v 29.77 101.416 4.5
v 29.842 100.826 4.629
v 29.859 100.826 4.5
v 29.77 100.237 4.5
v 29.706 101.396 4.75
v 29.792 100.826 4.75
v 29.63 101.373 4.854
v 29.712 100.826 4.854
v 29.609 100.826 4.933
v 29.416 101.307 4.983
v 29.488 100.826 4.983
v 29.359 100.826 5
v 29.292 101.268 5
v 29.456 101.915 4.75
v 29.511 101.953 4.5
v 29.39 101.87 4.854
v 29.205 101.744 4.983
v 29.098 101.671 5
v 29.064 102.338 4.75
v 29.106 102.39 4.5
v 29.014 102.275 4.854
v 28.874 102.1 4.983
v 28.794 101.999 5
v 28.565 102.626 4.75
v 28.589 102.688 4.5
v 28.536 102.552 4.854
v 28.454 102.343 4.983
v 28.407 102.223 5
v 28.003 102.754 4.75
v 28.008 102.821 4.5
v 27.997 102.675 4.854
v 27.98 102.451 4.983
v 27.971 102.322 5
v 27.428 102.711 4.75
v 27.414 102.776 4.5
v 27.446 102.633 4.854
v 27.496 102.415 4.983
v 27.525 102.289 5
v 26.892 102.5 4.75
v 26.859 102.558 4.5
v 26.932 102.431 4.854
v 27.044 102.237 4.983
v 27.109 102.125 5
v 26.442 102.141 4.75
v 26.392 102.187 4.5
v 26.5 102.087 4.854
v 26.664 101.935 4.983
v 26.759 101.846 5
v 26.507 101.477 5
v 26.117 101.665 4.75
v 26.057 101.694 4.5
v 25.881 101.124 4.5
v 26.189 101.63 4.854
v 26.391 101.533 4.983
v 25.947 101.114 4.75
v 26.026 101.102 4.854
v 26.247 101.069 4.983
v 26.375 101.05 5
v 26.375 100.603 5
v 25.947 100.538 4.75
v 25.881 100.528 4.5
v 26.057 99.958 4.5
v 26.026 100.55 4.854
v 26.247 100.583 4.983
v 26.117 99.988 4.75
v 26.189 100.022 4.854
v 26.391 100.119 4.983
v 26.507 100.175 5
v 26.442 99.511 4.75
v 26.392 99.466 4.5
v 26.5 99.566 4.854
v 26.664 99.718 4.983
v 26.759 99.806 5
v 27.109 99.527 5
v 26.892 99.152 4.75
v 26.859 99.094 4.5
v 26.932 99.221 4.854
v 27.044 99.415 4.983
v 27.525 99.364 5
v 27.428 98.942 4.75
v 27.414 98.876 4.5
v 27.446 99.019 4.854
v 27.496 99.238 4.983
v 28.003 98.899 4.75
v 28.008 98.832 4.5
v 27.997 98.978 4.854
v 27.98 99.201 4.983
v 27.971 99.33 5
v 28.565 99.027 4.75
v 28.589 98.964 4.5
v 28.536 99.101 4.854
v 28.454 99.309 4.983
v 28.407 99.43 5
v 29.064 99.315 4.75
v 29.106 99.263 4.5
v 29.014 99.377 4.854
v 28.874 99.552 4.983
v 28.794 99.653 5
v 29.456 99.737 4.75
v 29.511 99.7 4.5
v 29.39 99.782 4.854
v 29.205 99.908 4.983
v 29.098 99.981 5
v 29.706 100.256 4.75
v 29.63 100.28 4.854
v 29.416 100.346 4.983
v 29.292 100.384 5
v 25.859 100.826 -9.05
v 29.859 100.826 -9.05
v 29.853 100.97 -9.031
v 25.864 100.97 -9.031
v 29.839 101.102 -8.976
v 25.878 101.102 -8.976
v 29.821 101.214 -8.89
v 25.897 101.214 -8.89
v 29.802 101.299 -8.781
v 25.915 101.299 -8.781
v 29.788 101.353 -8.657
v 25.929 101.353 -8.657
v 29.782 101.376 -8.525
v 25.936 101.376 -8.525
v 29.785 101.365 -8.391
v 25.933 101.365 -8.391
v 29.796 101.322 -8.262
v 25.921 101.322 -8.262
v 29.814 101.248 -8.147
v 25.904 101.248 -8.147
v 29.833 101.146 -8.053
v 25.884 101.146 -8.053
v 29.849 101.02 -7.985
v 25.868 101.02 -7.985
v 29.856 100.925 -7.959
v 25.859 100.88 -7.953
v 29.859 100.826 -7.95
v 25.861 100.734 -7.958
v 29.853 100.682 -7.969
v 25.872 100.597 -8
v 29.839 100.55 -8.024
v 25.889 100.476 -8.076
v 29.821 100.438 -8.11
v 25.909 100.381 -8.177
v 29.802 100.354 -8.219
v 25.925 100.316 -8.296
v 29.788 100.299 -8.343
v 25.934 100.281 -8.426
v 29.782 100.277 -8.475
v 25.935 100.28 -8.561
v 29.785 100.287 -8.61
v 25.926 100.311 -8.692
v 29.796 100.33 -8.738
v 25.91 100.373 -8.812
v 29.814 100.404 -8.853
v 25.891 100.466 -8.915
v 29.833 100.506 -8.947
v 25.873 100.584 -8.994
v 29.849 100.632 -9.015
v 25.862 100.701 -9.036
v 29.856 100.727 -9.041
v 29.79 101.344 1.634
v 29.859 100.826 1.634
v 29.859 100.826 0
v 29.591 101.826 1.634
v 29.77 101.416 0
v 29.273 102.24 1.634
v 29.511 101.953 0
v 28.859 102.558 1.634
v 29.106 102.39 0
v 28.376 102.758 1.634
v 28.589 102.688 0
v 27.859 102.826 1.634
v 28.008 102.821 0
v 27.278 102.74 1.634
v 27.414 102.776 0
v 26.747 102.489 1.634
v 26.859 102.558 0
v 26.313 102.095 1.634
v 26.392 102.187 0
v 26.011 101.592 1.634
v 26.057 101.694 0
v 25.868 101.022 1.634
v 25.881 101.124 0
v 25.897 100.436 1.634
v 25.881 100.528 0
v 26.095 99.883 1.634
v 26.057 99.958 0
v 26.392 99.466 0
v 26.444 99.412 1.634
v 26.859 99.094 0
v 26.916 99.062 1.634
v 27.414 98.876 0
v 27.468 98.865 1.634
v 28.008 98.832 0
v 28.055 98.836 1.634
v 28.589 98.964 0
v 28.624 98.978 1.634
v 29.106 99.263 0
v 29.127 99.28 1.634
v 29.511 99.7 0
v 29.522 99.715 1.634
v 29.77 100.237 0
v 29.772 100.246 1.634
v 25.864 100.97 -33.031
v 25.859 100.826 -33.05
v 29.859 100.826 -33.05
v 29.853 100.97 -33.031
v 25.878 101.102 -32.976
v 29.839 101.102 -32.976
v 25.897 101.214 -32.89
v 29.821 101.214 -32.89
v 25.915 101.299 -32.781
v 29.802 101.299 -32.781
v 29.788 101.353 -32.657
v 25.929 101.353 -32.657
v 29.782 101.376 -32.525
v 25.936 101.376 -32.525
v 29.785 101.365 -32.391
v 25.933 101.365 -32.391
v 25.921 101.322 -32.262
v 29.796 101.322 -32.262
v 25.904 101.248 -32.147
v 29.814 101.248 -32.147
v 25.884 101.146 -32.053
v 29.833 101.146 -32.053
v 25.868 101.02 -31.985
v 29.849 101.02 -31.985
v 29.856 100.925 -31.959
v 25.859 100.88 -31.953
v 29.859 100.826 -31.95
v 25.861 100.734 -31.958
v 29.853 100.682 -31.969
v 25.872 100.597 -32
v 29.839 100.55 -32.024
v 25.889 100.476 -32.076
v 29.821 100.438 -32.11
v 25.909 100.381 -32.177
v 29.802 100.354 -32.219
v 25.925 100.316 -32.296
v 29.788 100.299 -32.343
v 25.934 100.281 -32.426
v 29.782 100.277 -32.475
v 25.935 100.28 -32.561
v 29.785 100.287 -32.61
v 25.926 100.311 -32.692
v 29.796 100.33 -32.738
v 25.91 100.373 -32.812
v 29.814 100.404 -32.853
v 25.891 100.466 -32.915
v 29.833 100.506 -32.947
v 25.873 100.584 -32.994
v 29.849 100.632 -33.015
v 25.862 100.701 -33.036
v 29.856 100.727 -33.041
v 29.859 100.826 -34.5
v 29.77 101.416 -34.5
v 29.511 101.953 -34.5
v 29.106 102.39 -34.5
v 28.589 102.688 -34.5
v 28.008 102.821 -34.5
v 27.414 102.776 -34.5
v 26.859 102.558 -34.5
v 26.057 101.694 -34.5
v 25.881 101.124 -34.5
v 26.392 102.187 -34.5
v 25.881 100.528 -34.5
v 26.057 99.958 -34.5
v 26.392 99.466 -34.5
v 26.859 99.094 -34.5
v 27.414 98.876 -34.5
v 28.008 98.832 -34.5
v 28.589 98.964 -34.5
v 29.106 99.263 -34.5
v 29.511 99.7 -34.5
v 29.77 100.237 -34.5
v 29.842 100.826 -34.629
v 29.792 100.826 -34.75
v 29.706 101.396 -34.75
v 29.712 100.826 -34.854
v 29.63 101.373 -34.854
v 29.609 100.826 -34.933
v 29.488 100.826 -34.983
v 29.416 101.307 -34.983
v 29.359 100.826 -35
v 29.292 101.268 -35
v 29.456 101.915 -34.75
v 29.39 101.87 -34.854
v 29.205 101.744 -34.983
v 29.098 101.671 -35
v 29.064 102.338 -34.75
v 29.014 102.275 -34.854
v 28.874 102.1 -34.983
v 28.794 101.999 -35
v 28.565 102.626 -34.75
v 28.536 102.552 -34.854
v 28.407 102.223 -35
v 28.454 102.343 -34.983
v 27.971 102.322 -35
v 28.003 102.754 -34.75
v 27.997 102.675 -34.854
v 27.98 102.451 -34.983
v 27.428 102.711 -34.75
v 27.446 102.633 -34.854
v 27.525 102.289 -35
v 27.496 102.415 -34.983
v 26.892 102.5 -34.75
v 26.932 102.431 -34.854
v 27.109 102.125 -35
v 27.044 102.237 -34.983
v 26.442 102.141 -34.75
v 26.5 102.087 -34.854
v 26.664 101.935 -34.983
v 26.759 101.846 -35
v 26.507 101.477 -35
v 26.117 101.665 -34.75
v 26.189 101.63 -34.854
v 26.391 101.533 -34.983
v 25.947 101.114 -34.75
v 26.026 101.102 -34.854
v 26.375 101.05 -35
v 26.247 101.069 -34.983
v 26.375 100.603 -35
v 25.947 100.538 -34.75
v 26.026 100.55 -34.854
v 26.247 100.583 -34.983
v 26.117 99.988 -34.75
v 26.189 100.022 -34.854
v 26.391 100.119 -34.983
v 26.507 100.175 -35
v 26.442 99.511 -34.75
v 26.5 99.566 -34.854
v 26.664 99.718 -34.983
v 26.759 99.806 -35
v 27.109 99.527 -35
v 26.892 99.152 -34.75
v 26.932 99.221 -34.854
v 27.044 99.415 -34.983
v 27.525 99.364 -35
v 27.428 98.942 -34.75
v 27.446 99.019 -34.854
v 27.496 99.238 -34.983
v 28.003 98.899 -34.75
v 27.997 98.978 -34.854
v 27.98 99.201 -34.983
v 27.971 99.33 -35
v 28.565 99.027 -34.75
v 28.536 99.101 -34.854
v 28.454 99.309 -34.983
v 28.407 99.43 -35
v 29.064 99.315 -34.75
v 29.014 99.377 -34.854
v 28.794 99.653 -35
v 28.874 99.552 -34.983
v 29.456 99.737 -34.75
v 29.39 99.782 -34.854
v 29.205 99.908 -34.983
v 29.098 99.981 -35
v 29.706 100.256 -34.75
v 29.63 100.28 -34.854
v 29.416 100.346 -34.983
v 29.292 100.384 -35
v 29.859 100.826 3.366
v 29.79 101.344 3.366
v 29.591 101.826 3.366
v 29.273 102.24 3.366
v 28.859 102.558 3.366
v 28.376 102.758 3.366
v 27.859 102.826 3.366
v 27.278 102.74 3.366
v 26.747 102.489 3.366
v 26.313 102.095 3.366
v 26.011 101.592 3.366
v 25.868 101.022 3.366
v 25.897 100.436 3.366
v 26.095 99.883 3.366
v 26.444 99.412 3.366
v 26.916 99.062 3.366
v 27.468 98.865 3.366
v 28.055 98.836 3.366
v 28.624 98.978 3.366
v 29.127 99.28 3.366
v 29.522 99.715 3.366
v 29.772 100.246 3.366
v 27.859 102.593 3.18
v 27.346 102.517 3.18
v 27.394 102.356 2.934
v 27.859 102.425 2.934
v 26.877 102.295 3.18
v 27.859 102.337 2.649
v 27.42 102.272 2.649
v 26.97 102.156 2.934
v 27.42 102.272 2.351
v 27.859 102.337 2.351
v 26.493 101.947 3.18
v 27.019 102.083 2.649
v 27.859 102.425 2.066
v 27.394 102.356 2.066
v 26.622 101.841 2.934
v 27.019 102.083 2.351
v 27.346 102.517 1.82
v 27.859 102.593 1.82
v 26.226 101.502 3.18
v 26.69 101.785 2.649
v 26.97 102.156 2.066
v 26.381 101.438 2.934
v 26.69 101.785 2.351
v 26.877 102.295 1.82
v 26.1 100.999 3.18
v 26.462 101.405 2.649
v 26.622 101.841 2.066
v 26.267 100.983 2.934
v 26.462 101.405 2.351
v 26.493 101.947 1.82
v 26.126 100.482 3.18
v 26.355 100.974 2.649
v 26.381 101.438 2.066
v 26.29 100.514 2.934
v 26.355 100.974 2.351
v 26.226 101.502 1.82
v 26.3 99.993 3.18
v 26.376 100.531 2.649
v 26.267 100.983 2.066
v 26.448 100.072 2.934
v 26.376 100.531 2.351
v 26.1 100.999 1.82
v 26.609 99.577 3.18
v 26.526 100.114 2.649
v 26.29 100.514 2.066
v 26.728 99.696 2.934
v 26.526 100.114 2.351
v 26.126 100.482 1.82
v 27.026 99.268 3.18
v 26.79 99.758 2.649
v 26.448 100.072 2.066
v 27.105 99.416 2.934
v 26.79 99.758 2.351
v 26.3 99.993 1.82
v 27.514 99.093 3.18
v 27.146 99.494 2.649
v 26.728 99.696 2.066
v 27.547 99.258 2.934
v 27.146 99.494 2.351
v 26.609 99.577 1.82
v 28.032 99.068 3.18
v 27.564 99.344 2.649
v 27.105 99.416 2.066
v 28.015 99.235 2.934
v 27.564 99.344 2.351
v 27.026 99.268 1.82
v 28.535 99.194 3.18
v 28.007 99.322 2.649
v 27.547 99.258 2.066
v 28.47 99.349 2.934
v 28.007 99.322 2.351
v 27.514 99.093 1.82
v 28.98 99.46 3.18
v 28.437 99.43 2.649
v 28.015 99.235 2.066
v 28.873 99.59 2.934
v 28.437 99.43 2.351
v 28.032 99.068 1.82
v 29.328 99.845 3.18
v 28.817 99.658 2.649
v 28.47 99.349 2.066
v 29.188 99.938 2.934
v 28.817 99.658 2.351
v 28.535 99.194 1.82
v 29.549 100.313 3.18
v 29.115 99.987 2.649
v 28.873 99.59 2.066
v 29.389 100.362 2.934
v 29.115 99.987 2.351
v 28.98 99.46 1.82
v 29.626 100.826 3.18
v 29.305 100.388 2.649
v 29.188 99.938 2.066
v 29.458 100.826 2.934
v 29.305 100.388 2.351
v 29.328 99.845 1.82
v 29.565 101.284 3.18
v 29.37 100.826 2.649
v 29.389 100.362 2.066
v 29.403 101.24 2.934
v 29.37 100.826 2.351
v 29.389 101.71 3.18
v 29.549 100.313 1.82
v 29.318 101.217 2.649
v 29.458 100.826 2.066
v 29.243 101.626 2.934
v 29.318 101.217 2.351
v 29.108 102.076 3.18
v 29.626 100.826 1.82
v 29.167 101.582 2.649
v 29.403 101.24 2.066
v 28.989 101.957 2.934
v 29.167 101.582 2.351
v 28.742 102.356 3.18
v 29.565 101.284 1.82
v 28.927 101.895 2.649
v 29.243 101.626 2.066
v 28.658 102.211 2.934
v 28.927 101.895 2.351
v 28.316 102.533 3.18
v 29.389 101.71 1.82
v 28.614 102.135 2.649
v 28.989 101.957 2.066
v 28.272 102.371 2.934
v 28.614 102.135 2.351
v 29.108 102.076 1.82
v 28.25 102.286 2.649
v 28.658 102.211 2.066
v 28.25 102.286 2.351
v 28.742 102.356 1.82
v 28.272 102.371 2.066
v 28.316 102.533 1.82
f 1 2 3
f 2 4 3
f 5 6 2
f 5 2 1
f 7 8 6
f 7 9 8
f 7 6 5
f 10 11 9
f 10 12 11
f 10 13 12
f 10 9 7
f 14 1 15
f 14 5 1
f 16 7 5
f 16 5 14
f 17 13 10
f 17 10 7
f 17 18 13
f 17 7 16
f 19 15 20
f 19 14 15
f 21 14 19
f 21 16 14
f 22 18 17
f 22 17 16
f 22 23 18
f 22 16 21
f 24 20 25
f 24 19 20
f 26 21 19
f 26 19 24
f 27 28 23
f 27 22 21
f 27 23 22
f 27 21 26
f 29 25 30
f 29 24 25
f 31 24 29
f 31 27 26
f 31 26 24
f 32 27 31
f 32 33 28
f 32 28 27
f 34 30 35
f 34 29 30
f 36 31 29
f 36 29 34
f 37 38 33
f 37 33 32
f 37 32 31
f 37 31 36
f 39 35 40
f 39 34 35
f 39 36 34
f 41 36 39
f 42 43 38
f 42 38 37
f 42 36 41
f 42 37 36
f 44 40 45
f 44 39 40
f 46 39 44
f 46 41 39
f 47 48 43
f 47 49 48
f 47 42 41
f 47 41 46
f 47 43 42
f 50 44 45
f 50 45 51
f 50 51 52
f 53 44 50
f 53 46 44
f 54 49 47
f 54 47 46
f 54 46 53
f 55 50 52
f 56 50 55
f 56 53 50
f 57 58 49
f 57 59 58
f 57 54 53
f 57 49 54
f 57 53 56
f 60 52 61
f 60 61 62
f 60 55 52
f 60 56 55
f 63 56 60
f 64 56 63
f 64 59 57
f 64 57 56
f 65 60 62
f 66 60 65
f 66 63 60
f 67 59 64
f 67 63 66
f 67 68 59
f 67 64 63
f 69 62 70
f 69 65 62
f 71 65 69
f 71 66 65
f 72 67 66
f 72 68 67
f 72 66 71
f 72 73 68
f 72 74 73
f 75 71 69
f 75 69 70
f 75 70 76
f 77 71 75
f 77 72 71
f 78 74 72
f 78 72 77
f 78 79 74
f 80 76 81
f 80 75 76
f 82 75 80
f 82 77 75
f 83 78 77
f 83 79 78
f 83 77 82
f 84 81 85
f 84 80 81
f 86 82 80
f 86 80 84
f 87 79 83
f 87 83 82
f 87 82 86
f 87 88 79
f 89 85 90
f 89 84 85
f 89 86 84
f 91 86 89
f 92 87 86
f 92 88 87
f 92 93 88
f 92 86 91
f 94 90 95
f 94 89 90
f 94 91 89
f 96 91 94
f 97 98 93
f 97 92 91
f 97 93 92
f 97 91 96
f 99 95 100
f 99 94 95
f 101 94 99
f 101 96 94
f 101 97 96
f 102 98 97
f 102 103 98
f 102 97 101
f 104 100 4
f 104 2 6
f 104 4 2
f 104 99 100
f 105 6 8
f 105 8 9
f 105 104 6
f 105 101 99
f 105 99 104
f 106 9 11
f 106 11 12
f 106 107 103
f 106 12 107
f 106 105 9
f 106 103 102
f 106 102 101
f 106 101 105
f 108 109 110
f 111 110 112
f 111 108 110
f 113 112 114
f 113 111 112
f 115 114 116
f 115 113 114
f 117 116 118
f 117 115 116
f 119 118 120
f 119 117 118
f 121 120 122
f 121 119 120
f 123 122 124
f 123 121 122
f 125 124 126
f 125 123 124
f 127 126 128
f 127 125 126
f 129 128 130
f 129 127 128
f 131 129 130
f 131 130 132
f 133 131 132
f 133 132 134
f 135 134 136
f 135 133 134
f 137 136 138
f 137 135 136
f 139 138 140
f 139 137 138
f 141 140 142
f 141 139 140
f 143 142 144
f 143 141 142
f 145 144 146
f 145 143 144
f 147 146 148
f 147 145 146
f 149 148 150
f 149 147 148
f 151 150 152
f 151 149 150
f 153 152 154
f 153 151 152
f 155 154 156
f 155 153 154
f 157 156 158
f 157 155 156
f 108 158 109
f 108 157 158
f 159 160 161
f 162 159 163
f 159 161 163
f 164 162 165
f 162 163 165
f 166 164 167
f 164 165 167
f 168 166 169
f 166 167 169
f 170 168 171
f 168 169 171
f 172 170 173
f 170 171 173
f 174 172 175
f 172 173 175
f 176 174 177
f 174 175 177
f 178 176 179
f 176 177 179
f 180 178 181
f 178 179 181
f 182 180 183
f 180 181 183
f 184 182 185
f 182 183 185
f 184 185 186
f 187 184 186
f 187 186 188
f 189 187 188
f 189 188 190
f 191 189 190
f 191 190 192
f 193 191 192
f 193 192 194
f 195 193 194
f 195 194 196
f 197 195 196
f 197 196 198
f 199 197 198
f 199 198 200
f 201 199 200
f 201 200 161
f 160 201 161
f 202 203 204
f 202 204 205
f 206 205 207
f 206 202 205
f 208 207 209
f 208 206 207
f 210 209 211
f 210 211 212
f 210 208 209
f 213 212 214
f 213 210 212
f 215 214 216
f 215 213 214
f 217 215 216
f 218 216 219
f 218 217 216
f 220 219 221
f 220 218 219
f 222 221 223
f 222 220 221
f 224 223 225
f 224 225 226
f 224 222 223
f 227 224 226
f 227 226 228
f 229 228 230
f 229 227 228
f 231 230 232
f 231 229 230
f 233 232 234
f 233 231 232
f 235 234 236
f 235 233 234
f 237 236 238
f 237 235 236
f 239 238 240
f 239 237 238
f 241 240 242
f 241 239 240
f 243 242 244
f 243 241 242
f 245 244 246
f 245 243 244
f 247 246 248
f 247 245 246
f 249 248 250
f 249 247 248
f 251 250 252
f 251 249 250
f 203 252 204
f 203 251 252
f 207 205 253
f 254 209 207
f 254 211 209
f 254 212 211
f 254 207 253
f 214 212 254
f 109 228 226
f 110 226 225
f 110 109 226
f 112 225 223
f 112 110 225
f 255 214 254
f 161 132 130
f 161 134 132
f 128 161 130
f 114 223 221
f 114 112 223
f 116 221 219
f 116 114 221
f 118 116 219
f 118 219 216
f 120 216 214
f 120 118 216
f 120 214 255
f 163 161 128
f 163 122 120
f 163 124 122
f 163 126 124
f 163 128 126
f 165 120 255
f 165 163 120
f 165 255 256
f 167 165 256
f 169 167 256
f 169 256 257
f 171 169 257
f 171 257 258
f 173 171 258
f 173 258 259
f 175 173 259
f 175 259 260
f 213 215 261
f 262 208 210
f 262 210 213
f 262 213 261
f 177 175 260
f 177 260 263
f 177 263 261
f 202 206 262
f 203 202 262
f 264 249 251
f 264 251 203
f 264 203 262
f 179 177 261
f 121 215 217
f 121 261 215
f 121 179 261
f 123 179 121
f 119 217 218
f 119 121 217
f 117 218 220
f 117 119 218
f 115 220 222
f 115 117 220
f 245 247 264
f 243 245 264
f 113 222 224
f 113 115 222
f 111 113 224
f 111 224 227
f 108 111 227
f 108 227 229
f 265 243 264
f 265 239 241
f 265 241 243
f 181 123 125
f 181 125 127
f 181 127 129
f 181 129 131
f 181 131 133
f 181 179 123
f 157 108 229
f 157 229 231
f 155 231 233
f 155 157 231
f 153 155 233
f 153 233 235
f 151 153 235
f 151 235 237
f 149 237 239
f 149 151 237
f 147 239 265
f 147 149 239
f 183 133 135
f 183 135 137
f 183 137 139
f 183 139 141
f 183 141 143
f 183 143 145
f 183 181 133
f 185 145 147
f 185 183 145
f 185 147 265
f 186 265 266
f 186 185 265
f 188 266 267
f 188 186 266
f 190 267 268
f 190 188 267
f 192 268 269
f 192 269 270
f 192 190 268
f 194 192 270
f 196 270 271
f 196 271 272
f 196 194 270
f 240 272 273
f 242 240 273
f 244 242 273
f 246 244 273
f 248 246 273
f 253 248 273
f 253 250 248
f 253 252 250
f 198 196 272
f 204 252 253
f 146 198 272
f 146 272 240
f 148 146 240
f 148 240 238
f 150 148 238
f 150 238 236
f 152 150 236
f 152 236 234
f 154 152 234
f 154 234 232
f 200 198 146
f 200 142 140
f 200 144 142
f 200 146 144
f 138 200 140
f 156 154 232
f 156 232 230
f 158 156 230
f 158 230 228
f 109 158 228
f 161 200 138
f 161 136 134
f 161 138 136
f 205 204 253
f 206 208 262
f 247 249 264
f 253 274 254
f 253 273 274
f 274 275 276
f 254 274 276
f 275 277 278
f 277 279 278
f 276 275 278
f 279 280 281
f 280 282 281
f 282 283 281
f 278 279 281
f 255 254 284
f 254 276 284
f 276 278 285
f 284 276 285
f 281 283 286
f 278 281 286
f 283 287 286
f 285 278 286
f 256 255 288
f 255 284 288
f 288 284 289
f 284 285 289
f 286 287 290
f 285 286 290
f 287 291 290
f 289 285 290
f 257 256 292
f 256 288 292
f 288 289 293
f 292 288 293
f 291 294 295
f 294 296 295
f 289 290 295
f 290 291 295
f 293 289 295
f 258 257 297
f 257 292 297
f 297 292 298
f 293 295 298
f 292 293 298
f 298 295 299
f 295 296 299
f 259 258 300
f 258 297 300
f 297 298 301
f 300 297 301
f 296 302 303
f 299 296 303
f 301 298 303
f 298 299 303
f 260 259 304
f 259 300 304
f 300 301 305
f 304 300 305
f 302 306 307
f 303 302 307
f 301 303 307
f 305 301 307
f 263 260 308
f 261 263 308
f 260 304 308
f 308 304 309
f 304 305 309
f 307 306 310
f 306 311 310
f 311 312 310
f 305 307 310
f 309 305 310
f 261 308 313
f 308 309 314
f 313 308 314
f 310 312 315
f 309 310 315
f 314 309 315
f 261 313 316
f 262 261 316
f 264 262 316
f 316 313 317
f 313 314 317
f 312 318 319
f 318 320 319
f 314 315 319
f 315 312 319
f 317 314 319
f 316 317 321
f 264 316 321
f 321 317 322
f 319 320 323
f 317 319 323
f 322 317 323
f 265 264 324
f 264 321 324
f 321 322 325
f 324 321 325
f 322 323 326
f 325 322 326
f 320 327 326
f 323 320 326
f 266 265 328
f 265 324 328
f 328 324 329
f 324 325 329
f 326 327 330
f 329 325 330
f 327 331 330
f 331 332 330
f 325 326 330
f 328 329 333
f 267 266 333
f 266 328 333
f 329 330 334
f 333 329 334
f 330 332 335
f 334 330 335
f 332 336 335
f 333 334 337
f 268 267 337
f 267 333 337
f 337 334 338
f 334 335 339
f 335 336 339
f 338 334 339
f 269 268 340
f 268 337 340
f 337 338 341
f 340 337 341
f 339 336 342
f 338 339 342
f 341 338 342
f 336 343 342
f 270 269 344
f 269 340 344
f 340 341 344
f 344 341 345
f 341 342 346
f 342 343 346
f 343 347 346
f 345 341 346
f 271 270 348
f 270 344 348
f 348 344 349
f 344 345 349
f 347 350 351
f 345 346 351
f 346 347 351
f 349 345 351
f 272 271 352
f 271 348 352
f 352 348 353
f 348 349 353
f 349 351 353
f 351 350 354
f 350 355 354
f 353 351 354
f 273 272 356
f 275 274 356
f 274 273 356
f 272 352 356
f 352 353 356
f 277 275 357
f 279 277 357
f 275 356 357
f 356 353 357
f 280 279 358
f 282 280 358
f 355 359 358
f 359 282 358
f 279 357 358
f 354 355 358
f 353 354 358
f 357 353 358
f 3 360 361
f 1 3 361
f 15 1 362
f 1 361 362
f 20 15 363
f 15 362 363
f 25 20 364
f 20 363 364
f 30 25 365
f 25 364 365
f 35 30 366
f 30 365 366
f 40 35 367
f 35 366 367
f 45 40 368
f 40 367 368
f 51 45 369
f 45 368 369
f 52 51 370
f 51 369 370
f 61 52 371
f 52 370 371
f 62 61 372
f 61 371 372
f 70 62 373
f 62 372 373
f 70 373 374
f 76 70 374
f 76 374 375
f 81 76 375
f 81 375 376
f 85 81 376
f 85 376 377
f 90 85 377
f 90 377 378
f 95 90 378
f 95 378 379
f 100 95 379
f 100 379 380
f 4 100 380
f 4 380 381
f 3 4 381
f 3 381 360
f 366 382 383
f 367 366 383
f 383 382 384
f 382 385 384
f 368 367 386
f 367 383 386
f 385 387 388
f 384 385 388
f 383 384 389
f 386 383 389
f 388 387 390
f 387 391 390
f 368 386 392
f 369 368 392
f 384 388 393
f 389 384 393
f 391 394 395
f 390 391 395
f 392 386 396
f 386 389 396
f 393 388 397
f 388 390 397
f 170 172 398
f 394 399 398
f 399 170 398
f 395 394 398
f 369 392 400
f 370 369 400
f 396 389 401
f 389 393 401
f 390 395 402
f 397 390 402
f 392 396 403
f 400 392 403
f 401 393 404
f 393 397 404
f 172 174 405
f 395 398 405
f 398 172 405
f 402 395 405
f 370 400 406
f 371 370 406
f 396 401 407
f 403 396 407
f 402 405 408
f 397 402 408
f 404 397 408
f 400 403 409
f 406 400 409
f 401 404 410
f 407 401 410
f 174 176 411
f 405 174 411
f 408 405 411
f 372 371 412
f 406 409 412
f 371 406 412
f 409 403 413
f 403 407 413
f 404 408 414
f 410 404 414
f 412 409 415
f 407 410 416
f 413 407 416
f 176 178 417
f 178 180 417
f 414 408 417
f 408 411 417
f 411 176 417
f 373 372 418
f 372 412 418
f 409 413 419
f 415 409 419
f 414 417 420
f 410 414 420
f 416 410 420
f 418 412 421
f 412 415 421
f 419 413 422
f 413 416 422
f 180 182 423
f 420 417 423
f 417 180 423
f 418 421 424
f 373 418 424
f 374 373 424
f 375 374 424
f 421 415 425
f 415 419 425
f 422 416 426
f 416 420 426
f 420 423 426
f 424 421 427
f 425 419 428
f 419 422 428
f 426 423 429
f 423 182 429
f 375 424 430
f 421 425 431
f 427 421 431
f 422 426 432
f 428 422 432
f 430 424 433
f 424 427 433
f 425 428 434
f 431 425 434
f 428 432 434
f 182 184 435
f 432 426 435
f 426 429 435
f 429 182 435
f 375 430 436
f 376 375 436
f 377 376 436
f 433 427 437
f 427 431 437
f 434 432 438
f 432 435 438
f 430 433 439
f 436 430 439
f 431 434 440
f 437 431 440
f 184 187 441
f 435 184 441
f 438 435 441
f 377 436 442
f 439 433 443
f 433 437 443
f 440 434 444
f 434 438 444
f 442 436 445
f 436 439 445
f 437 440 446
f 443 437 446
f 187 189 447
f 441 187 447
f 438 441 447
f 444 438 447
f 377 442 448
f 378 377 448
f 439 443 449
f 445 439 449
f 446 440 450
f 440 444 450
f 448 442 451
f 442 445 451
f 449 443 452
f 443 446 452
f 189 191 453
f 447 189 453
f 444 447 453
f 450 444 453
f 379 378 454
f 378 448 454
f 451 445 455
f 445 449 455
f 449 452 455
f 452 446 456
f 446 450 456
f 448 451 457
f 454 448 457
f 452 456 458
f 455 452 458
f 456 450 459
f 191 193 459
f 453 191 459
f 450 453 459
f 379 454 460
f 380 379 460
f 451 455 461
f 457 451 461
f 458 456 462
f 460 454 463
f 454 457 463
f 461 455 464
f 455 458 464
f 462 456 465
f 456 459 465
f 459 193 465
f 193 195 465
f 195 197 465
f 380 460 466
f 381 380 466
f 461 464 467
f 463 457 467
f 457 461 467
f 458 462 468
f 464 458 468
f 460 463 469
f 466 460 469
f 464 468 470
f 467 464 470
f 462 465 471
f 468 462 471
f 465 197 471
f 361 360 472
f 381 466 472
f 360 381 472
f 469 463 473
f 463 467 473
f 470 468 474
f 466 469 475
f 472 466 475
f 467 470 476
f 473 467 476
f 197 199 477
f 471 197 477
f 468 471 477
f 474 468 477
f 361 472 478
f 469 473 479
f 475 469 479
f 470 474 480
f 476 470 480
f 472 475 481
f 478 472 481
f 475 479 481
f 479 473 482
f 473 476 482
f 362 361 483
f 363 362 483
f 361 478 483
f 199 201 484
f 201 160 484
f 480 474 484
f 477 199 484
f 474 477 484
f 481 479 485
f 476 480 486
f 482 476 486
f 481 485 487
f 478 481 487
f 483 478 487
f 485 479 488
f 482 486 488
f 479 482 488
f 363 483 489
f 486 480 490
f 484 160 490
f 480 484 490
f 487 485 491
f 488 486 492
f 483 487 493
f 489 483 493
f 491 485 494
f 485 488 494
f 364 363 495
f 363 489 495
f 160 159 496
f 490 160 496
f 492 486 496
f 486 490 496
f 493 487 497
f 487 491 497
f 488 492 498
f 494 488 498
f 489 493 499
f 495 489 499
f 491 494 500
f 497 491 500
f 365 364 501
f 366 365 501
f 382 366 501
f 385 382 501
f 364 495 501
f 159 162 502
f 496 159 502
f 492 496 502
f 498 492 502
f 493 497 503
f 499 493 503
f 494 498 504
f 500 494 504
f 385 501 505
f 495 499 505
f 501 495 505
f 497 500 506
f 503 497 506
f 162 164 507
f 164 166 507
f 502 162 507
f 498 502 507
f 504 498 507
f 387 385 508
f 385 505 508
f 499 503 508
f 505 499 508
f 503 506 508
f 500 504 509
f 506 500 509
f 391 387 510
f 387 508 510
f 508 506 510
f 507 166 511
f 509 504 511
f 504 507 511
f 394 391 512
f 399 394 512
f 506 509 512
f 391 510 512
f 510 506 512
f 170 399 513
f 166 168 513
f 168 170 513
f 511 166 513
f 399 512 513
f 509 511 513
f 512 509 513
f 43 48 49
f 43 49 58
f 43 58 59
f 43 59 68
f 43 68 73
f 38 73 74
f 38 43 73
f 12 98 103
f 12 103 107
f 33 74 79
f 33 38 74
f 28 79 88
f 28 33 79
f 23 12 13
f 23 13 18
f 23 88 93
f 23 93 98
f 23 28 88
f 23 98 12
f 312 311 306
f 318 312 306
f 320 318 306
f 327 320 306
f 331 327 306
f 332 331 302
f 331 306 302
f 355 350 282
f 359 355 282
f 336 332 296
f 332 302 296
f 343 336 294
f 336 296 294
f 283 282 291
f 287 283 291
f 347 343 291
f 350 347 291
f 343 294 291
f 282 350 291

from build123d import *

# Parameters (mm, degrees)
SKETCH1_R               = 2
BOSS_EXTRUDE1_DEPTH     = 35
SKETCH2_R               = 2
BOSS_EXTRUDE2_DEPTH     = 5
SKETCH3_R               = 1
FILLET1_R               = 0.5
SKETCH4_R               = 0.55
CUT_EXTRUDE1_DEPTH      = 30.858564979
CUT_EXTRUDE1_DEPTH_BACK = 1


with BuildPart() as part:
    # Sketch1 → Boss-Extrude1 (new body)
    with BuildSketch(Plane.XY):
        with Locations((27.858564979, 100.826239149)):
            Circle(SKETCH1_R)
    extrude(amount=-BOSS_EXTRUDE1_DEPTH)

    # Sketch2 → Boss-Extrude2 (add)
    with BuildSketch(Plane.XY):
        with Locations((27.858564979, 100.826239149)):
            Circle(SKETCH2_R)
    extrude(amount=BOSS_EXTRUDE2_DEPTH)

    # Sketch3 → Cut-Revolve1 (revolve, cut)
    with BuildSketch(Plane(origin=(27.858564979, 0, 0), x_dir=(0, 0, -1), z_dir=(1, 0, 0))):
        with Locations((-2.5, 103.326239149)):
            Circle(SKETCH3_R)
    revolve(axis=Axis((27.858564979, 100.826239149, -35), (0, 0, 1)), mode=Mode.SUBTRACT)

    # Fillet1
    fillet1_edges = [part.edges().sort_by_distance(p)[0] for p in [
        (25.858564979, 100.826239149, -35),
        (25.858564979, 100.826239149, 5),
    ]]
    fillet(fillet1_edges, radius=FILLET1_R)

    # Sketch4 → Cut-Extrude1 (cut, two sides)
    with BuildSketch(Plane(origin=(0, 0, 0), x_dir=(0, 0, -1), z_dir=(1, 0, 0))) as cut_extrude1_sk:
        with Locations((32.5, 100.826239149)):
            Circle(SKETCH4_R)
        with Locations((8.5, 100.826239149)):
            Circle(SKETCH4_R)
    extrude(amount=CUT_EXTRUDE1_DEPTH, mode=Mode.SUBTRACT)
    extrude(cut_extrude1_sk.sketch, amount=-CUT_EXTRUDE1_DEPTH_BACK, mode=Mode.SUBTRACT)


solid = part.part
